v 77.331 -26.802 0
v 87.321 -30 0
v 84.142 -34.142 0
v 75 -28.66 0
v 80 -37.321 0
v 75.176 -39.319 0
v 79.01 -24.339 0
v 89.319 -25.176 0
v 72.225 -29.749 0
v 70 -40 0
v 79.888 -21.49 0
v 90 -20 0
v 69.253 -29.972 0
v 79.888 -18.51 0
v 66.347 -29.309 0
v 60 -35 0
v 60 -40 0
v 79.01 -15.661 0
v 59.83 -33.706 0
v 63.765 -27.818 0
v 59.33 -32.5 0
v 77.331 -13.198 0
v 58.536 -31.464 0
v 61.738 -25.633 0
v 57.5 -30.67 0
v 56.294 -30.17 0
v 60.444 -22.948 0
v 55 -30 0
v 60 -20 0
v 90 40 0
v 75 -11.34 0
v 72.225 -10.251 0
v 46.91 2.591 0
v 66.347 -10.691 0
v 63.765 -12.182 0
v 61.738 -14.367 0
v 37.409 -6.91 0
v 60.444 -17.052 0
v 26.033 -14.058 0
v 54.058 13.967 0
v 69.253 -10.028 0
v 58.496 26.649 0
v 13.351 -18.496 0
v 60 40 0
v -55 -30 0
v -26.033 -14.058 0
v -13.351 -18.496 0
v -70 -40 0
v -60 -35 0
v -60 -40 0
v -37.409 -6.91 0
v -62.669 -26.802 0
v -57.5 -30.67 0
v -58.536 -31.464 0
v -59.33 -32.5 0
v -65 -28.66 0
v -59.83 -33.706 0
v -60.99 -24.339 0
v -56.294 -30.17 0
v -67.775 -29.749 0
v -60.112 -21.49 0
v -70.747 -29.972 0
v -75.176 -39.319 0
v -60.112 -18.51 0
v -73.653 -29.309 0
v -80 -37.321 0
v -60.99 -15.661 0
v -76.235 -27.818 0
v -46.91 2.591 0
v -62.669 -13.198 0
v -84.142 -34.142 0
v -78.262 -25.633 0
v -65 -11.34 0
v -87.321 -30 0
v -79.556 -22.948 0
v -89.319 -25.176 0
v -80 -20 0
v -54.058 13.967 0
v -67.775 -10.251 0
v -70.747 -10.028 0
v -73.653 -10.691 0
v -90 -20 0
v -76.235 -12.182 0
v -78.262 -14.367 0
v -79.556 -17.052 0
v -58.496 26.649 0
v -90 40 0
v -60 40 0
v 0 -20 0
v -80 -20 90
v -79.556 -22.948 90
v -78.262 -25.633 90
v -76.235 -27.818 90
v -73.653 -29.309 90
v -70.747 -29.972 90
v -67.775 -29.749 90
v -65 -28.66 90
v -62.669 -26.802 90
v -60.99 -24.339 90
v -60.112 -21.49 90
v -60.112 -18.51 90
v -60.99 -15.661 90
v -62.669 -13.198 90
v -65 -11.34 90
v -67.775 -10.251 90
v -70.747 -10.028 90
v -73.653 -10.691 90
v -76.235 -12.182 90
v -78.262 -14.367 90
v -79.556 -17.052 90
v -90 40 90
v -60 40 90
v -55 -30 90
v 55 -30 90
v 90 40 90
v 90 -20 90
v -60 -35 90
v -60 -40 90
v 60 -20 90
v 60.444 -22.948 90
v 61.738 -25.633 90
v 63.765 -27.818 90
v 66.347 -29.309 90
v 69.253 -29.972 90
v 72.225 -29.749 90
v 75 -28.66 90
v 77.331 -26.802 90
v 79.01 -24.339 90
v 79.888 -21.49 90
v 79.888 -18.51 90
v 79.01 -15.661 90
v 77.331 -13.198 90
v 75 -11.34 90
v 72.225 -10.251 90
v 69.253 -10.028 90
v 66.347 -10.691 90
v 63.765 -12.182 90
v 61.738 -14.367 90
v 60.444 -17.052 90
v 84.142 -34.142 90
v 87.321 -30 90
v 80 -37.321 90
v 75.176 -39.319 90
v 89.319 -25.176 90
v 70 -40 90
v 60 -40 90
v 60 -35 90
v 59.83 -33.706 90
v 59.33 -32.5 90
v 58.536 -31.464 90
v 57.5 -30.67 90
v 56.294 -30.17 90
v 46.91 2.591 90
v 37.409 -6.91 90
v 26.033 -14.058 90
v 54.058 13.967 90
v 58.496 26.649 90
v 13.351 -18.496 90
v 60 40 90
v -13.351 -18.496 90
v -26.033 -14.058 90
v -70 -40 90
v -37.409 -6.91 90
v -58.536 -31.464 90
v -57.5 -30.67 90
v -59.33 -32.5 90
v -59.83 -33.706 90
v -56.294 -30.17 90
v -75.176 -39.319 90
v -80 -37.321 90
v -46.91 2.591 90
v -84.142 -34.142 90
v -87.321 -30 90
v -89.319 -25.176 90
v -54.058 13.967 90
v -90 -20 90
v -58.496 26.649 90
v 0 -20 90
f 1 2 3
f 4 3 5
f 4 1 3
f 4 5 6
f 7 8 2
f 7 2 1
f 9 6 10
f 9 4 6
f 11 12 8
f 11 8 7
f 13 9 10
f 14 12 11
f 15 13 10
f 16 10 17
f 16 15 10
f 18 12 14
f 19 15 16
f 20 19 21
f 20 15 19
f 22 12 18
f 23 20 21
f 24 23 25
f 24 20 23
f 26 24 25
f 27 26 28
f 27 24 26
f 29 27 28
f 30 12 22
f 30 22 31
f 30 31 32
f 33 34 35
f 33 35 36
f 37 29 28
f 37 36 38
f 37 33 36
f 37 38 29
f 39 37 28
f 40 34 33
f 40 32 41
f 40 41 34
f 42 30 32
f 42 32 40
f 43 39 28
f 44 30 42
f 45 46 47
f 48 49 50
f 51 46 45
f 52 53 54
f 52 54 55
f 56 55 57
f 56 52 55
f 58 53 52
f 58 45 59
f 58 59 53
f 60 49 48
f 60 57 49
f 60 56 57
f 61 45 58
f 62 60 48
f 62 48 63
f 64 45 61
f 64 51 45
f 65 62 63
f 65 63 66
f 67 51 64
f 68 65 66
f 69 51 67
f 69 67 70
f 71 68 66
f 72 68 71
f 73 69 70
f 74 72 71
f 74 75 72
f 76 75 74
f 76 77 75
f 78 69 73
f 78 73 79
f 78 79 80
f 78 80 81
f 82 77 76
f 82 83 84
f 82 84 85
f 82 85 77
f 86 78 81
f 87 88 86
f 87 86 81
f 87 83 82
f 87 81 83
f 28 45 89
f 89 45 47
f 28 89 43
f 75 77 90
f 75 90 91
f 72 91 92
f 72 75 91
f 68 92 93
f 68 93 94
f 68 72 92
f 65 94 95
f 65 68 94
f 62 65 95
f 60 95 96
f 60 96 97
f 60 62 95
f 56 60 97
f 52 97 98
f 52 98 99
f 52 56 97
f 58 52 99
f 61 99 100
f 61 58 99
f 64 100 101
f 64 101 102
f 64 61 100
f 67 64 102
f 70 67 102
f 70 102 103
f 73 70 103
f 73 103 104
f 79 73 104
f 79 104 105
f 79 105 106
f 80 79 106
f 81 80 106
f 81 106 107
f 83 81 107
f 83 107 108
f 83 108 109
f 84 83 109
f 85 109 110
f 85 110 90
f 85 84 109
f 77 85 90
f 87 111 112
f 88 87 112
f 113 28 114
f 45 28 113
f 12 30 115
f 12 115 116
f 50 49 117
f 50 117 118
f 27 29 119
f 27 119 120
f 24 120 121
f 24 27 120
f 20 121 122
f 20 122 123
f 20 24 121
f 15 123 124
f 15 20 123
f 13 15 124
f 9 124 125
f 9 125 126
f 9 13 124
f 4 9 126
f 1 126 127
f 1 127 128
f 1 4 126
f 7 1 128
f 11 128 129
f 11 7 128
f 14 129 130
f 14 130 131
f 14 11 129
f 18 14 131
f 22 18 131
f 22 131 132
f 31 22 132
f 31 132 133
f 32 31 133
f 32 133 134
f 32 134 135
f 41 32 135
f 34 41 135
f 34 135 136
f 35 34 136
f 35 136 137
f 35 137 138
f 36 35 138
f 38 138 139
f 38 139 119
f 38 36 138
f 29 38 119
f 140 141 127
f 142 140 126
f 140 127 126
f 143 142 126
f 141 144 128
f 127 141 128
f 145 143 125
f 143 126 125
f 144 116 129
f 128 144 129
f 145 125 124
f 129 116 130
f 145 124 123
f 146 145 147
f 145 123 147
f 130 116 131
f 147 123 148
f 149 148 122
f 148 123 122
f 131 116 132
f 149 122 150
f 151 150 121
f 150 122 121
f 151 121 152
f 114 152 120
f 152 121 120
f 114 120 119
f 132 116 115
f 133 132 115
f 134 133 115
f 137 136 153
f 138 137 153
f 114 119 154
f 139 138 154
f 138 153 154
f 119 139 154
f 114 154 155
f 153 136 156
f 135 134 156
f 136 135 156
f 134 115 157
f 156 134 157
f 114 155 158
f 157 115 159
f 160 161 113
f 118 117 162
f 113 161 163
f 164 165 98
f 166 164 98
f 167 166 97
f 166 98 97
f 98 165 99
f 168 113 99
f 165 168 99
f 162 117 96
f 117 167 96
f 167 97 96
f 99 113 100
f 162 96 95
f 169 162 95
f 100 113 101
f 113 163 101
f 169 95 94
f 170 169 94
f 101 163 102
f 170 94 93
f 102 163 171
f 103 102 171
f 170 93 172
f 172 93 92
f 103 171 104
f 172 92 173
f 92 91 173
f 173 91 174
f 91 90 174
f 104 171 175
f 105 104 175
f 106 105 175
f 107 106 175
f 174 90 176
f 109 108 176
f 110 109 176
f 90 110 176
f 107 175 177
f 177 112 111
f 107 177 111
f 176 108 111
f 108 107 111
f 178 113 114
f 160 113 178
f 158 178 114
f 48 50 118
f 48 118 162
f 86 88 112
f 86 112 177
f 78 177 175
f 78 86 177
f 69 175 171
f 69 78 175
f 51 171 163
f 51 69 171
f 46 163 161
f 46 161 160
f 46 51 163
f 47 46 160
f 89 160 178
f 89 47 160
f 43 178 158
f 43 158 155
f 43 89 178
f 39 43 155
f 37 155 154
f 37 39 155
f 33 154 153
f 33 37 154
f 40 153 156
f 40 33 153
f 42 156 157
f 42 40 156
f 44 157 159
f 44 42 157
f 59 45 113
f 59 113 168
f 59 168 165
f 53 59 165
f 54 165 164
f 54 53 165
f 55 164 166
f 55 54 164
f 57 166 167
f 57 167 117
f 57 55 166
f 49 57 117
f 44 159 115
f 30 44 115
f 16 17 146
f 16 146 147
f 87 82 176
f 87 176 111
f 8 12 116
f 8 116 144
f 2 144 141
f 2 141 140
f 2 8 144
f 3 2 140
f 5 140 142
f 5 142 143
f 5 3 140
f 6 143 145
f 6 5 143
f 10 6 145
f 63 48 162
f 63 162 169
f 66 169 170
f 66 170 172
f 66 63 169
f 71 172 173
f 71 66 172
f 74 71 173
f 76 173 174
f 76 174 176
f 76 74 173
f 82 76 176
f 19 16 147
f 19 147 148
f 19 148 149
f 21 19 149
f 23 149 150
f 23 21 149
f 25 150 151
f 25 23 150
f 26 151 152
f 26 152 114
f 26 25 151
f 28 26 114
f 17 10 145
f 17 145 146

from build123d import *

# Parameters (mm, degrees)
SKETCH1_R           = 10
BOSS_EXTRUDE1_DEPTH = 90


with BuildPart() as part:
    # Sketch1 → Boss-Extrude1 (new body)
    with BuildSketch(Plane.XY):
        with BuildLine():
            Line((60, 40), (90, 40))
            Line((90, 40), (90, -20))
            ThreePointArc((90, -20), (84.142135624, -34.142135624), (70, -40))
            Line((70, -40), (60, -40))
            Line((60, -40), (60, -35))
            ThreePointArc((60, -35), (58.535533906, -31.464466094), (55, -30))
            Line((55, -30), (-55, -30))
            ThreePointArc((-55, -30), (-58.535533906, -31.464466094), (-60, -35))
            Line((-60, -35), (-60, -40))
            Line((-60, -40), (-70, -40))
            ThreePointArc((-70, -40), (-84.142135624, -34.142135624), (-90, -20))
            Line((-90, -20), (-90, 40))
            Line((-90, 40), (-60, 40))
            ThreePointArc((-60, 40), (0, -20), (60, 40))
        make_face()
        with Locations(Location((-70, -20, 0), (0, 0, 180))):
            Circle(SKETCH1_R, mode=Mode.SUBTRACT)
        with Locations(Location((70, -20, 0), (0, 0, 180))):
            Circle(SKETCH1_R, mode=Mode.SUBTRACT)
    extrude(amount=BOSS_EXTRUDE1_DEPTH)


solid = part.part
